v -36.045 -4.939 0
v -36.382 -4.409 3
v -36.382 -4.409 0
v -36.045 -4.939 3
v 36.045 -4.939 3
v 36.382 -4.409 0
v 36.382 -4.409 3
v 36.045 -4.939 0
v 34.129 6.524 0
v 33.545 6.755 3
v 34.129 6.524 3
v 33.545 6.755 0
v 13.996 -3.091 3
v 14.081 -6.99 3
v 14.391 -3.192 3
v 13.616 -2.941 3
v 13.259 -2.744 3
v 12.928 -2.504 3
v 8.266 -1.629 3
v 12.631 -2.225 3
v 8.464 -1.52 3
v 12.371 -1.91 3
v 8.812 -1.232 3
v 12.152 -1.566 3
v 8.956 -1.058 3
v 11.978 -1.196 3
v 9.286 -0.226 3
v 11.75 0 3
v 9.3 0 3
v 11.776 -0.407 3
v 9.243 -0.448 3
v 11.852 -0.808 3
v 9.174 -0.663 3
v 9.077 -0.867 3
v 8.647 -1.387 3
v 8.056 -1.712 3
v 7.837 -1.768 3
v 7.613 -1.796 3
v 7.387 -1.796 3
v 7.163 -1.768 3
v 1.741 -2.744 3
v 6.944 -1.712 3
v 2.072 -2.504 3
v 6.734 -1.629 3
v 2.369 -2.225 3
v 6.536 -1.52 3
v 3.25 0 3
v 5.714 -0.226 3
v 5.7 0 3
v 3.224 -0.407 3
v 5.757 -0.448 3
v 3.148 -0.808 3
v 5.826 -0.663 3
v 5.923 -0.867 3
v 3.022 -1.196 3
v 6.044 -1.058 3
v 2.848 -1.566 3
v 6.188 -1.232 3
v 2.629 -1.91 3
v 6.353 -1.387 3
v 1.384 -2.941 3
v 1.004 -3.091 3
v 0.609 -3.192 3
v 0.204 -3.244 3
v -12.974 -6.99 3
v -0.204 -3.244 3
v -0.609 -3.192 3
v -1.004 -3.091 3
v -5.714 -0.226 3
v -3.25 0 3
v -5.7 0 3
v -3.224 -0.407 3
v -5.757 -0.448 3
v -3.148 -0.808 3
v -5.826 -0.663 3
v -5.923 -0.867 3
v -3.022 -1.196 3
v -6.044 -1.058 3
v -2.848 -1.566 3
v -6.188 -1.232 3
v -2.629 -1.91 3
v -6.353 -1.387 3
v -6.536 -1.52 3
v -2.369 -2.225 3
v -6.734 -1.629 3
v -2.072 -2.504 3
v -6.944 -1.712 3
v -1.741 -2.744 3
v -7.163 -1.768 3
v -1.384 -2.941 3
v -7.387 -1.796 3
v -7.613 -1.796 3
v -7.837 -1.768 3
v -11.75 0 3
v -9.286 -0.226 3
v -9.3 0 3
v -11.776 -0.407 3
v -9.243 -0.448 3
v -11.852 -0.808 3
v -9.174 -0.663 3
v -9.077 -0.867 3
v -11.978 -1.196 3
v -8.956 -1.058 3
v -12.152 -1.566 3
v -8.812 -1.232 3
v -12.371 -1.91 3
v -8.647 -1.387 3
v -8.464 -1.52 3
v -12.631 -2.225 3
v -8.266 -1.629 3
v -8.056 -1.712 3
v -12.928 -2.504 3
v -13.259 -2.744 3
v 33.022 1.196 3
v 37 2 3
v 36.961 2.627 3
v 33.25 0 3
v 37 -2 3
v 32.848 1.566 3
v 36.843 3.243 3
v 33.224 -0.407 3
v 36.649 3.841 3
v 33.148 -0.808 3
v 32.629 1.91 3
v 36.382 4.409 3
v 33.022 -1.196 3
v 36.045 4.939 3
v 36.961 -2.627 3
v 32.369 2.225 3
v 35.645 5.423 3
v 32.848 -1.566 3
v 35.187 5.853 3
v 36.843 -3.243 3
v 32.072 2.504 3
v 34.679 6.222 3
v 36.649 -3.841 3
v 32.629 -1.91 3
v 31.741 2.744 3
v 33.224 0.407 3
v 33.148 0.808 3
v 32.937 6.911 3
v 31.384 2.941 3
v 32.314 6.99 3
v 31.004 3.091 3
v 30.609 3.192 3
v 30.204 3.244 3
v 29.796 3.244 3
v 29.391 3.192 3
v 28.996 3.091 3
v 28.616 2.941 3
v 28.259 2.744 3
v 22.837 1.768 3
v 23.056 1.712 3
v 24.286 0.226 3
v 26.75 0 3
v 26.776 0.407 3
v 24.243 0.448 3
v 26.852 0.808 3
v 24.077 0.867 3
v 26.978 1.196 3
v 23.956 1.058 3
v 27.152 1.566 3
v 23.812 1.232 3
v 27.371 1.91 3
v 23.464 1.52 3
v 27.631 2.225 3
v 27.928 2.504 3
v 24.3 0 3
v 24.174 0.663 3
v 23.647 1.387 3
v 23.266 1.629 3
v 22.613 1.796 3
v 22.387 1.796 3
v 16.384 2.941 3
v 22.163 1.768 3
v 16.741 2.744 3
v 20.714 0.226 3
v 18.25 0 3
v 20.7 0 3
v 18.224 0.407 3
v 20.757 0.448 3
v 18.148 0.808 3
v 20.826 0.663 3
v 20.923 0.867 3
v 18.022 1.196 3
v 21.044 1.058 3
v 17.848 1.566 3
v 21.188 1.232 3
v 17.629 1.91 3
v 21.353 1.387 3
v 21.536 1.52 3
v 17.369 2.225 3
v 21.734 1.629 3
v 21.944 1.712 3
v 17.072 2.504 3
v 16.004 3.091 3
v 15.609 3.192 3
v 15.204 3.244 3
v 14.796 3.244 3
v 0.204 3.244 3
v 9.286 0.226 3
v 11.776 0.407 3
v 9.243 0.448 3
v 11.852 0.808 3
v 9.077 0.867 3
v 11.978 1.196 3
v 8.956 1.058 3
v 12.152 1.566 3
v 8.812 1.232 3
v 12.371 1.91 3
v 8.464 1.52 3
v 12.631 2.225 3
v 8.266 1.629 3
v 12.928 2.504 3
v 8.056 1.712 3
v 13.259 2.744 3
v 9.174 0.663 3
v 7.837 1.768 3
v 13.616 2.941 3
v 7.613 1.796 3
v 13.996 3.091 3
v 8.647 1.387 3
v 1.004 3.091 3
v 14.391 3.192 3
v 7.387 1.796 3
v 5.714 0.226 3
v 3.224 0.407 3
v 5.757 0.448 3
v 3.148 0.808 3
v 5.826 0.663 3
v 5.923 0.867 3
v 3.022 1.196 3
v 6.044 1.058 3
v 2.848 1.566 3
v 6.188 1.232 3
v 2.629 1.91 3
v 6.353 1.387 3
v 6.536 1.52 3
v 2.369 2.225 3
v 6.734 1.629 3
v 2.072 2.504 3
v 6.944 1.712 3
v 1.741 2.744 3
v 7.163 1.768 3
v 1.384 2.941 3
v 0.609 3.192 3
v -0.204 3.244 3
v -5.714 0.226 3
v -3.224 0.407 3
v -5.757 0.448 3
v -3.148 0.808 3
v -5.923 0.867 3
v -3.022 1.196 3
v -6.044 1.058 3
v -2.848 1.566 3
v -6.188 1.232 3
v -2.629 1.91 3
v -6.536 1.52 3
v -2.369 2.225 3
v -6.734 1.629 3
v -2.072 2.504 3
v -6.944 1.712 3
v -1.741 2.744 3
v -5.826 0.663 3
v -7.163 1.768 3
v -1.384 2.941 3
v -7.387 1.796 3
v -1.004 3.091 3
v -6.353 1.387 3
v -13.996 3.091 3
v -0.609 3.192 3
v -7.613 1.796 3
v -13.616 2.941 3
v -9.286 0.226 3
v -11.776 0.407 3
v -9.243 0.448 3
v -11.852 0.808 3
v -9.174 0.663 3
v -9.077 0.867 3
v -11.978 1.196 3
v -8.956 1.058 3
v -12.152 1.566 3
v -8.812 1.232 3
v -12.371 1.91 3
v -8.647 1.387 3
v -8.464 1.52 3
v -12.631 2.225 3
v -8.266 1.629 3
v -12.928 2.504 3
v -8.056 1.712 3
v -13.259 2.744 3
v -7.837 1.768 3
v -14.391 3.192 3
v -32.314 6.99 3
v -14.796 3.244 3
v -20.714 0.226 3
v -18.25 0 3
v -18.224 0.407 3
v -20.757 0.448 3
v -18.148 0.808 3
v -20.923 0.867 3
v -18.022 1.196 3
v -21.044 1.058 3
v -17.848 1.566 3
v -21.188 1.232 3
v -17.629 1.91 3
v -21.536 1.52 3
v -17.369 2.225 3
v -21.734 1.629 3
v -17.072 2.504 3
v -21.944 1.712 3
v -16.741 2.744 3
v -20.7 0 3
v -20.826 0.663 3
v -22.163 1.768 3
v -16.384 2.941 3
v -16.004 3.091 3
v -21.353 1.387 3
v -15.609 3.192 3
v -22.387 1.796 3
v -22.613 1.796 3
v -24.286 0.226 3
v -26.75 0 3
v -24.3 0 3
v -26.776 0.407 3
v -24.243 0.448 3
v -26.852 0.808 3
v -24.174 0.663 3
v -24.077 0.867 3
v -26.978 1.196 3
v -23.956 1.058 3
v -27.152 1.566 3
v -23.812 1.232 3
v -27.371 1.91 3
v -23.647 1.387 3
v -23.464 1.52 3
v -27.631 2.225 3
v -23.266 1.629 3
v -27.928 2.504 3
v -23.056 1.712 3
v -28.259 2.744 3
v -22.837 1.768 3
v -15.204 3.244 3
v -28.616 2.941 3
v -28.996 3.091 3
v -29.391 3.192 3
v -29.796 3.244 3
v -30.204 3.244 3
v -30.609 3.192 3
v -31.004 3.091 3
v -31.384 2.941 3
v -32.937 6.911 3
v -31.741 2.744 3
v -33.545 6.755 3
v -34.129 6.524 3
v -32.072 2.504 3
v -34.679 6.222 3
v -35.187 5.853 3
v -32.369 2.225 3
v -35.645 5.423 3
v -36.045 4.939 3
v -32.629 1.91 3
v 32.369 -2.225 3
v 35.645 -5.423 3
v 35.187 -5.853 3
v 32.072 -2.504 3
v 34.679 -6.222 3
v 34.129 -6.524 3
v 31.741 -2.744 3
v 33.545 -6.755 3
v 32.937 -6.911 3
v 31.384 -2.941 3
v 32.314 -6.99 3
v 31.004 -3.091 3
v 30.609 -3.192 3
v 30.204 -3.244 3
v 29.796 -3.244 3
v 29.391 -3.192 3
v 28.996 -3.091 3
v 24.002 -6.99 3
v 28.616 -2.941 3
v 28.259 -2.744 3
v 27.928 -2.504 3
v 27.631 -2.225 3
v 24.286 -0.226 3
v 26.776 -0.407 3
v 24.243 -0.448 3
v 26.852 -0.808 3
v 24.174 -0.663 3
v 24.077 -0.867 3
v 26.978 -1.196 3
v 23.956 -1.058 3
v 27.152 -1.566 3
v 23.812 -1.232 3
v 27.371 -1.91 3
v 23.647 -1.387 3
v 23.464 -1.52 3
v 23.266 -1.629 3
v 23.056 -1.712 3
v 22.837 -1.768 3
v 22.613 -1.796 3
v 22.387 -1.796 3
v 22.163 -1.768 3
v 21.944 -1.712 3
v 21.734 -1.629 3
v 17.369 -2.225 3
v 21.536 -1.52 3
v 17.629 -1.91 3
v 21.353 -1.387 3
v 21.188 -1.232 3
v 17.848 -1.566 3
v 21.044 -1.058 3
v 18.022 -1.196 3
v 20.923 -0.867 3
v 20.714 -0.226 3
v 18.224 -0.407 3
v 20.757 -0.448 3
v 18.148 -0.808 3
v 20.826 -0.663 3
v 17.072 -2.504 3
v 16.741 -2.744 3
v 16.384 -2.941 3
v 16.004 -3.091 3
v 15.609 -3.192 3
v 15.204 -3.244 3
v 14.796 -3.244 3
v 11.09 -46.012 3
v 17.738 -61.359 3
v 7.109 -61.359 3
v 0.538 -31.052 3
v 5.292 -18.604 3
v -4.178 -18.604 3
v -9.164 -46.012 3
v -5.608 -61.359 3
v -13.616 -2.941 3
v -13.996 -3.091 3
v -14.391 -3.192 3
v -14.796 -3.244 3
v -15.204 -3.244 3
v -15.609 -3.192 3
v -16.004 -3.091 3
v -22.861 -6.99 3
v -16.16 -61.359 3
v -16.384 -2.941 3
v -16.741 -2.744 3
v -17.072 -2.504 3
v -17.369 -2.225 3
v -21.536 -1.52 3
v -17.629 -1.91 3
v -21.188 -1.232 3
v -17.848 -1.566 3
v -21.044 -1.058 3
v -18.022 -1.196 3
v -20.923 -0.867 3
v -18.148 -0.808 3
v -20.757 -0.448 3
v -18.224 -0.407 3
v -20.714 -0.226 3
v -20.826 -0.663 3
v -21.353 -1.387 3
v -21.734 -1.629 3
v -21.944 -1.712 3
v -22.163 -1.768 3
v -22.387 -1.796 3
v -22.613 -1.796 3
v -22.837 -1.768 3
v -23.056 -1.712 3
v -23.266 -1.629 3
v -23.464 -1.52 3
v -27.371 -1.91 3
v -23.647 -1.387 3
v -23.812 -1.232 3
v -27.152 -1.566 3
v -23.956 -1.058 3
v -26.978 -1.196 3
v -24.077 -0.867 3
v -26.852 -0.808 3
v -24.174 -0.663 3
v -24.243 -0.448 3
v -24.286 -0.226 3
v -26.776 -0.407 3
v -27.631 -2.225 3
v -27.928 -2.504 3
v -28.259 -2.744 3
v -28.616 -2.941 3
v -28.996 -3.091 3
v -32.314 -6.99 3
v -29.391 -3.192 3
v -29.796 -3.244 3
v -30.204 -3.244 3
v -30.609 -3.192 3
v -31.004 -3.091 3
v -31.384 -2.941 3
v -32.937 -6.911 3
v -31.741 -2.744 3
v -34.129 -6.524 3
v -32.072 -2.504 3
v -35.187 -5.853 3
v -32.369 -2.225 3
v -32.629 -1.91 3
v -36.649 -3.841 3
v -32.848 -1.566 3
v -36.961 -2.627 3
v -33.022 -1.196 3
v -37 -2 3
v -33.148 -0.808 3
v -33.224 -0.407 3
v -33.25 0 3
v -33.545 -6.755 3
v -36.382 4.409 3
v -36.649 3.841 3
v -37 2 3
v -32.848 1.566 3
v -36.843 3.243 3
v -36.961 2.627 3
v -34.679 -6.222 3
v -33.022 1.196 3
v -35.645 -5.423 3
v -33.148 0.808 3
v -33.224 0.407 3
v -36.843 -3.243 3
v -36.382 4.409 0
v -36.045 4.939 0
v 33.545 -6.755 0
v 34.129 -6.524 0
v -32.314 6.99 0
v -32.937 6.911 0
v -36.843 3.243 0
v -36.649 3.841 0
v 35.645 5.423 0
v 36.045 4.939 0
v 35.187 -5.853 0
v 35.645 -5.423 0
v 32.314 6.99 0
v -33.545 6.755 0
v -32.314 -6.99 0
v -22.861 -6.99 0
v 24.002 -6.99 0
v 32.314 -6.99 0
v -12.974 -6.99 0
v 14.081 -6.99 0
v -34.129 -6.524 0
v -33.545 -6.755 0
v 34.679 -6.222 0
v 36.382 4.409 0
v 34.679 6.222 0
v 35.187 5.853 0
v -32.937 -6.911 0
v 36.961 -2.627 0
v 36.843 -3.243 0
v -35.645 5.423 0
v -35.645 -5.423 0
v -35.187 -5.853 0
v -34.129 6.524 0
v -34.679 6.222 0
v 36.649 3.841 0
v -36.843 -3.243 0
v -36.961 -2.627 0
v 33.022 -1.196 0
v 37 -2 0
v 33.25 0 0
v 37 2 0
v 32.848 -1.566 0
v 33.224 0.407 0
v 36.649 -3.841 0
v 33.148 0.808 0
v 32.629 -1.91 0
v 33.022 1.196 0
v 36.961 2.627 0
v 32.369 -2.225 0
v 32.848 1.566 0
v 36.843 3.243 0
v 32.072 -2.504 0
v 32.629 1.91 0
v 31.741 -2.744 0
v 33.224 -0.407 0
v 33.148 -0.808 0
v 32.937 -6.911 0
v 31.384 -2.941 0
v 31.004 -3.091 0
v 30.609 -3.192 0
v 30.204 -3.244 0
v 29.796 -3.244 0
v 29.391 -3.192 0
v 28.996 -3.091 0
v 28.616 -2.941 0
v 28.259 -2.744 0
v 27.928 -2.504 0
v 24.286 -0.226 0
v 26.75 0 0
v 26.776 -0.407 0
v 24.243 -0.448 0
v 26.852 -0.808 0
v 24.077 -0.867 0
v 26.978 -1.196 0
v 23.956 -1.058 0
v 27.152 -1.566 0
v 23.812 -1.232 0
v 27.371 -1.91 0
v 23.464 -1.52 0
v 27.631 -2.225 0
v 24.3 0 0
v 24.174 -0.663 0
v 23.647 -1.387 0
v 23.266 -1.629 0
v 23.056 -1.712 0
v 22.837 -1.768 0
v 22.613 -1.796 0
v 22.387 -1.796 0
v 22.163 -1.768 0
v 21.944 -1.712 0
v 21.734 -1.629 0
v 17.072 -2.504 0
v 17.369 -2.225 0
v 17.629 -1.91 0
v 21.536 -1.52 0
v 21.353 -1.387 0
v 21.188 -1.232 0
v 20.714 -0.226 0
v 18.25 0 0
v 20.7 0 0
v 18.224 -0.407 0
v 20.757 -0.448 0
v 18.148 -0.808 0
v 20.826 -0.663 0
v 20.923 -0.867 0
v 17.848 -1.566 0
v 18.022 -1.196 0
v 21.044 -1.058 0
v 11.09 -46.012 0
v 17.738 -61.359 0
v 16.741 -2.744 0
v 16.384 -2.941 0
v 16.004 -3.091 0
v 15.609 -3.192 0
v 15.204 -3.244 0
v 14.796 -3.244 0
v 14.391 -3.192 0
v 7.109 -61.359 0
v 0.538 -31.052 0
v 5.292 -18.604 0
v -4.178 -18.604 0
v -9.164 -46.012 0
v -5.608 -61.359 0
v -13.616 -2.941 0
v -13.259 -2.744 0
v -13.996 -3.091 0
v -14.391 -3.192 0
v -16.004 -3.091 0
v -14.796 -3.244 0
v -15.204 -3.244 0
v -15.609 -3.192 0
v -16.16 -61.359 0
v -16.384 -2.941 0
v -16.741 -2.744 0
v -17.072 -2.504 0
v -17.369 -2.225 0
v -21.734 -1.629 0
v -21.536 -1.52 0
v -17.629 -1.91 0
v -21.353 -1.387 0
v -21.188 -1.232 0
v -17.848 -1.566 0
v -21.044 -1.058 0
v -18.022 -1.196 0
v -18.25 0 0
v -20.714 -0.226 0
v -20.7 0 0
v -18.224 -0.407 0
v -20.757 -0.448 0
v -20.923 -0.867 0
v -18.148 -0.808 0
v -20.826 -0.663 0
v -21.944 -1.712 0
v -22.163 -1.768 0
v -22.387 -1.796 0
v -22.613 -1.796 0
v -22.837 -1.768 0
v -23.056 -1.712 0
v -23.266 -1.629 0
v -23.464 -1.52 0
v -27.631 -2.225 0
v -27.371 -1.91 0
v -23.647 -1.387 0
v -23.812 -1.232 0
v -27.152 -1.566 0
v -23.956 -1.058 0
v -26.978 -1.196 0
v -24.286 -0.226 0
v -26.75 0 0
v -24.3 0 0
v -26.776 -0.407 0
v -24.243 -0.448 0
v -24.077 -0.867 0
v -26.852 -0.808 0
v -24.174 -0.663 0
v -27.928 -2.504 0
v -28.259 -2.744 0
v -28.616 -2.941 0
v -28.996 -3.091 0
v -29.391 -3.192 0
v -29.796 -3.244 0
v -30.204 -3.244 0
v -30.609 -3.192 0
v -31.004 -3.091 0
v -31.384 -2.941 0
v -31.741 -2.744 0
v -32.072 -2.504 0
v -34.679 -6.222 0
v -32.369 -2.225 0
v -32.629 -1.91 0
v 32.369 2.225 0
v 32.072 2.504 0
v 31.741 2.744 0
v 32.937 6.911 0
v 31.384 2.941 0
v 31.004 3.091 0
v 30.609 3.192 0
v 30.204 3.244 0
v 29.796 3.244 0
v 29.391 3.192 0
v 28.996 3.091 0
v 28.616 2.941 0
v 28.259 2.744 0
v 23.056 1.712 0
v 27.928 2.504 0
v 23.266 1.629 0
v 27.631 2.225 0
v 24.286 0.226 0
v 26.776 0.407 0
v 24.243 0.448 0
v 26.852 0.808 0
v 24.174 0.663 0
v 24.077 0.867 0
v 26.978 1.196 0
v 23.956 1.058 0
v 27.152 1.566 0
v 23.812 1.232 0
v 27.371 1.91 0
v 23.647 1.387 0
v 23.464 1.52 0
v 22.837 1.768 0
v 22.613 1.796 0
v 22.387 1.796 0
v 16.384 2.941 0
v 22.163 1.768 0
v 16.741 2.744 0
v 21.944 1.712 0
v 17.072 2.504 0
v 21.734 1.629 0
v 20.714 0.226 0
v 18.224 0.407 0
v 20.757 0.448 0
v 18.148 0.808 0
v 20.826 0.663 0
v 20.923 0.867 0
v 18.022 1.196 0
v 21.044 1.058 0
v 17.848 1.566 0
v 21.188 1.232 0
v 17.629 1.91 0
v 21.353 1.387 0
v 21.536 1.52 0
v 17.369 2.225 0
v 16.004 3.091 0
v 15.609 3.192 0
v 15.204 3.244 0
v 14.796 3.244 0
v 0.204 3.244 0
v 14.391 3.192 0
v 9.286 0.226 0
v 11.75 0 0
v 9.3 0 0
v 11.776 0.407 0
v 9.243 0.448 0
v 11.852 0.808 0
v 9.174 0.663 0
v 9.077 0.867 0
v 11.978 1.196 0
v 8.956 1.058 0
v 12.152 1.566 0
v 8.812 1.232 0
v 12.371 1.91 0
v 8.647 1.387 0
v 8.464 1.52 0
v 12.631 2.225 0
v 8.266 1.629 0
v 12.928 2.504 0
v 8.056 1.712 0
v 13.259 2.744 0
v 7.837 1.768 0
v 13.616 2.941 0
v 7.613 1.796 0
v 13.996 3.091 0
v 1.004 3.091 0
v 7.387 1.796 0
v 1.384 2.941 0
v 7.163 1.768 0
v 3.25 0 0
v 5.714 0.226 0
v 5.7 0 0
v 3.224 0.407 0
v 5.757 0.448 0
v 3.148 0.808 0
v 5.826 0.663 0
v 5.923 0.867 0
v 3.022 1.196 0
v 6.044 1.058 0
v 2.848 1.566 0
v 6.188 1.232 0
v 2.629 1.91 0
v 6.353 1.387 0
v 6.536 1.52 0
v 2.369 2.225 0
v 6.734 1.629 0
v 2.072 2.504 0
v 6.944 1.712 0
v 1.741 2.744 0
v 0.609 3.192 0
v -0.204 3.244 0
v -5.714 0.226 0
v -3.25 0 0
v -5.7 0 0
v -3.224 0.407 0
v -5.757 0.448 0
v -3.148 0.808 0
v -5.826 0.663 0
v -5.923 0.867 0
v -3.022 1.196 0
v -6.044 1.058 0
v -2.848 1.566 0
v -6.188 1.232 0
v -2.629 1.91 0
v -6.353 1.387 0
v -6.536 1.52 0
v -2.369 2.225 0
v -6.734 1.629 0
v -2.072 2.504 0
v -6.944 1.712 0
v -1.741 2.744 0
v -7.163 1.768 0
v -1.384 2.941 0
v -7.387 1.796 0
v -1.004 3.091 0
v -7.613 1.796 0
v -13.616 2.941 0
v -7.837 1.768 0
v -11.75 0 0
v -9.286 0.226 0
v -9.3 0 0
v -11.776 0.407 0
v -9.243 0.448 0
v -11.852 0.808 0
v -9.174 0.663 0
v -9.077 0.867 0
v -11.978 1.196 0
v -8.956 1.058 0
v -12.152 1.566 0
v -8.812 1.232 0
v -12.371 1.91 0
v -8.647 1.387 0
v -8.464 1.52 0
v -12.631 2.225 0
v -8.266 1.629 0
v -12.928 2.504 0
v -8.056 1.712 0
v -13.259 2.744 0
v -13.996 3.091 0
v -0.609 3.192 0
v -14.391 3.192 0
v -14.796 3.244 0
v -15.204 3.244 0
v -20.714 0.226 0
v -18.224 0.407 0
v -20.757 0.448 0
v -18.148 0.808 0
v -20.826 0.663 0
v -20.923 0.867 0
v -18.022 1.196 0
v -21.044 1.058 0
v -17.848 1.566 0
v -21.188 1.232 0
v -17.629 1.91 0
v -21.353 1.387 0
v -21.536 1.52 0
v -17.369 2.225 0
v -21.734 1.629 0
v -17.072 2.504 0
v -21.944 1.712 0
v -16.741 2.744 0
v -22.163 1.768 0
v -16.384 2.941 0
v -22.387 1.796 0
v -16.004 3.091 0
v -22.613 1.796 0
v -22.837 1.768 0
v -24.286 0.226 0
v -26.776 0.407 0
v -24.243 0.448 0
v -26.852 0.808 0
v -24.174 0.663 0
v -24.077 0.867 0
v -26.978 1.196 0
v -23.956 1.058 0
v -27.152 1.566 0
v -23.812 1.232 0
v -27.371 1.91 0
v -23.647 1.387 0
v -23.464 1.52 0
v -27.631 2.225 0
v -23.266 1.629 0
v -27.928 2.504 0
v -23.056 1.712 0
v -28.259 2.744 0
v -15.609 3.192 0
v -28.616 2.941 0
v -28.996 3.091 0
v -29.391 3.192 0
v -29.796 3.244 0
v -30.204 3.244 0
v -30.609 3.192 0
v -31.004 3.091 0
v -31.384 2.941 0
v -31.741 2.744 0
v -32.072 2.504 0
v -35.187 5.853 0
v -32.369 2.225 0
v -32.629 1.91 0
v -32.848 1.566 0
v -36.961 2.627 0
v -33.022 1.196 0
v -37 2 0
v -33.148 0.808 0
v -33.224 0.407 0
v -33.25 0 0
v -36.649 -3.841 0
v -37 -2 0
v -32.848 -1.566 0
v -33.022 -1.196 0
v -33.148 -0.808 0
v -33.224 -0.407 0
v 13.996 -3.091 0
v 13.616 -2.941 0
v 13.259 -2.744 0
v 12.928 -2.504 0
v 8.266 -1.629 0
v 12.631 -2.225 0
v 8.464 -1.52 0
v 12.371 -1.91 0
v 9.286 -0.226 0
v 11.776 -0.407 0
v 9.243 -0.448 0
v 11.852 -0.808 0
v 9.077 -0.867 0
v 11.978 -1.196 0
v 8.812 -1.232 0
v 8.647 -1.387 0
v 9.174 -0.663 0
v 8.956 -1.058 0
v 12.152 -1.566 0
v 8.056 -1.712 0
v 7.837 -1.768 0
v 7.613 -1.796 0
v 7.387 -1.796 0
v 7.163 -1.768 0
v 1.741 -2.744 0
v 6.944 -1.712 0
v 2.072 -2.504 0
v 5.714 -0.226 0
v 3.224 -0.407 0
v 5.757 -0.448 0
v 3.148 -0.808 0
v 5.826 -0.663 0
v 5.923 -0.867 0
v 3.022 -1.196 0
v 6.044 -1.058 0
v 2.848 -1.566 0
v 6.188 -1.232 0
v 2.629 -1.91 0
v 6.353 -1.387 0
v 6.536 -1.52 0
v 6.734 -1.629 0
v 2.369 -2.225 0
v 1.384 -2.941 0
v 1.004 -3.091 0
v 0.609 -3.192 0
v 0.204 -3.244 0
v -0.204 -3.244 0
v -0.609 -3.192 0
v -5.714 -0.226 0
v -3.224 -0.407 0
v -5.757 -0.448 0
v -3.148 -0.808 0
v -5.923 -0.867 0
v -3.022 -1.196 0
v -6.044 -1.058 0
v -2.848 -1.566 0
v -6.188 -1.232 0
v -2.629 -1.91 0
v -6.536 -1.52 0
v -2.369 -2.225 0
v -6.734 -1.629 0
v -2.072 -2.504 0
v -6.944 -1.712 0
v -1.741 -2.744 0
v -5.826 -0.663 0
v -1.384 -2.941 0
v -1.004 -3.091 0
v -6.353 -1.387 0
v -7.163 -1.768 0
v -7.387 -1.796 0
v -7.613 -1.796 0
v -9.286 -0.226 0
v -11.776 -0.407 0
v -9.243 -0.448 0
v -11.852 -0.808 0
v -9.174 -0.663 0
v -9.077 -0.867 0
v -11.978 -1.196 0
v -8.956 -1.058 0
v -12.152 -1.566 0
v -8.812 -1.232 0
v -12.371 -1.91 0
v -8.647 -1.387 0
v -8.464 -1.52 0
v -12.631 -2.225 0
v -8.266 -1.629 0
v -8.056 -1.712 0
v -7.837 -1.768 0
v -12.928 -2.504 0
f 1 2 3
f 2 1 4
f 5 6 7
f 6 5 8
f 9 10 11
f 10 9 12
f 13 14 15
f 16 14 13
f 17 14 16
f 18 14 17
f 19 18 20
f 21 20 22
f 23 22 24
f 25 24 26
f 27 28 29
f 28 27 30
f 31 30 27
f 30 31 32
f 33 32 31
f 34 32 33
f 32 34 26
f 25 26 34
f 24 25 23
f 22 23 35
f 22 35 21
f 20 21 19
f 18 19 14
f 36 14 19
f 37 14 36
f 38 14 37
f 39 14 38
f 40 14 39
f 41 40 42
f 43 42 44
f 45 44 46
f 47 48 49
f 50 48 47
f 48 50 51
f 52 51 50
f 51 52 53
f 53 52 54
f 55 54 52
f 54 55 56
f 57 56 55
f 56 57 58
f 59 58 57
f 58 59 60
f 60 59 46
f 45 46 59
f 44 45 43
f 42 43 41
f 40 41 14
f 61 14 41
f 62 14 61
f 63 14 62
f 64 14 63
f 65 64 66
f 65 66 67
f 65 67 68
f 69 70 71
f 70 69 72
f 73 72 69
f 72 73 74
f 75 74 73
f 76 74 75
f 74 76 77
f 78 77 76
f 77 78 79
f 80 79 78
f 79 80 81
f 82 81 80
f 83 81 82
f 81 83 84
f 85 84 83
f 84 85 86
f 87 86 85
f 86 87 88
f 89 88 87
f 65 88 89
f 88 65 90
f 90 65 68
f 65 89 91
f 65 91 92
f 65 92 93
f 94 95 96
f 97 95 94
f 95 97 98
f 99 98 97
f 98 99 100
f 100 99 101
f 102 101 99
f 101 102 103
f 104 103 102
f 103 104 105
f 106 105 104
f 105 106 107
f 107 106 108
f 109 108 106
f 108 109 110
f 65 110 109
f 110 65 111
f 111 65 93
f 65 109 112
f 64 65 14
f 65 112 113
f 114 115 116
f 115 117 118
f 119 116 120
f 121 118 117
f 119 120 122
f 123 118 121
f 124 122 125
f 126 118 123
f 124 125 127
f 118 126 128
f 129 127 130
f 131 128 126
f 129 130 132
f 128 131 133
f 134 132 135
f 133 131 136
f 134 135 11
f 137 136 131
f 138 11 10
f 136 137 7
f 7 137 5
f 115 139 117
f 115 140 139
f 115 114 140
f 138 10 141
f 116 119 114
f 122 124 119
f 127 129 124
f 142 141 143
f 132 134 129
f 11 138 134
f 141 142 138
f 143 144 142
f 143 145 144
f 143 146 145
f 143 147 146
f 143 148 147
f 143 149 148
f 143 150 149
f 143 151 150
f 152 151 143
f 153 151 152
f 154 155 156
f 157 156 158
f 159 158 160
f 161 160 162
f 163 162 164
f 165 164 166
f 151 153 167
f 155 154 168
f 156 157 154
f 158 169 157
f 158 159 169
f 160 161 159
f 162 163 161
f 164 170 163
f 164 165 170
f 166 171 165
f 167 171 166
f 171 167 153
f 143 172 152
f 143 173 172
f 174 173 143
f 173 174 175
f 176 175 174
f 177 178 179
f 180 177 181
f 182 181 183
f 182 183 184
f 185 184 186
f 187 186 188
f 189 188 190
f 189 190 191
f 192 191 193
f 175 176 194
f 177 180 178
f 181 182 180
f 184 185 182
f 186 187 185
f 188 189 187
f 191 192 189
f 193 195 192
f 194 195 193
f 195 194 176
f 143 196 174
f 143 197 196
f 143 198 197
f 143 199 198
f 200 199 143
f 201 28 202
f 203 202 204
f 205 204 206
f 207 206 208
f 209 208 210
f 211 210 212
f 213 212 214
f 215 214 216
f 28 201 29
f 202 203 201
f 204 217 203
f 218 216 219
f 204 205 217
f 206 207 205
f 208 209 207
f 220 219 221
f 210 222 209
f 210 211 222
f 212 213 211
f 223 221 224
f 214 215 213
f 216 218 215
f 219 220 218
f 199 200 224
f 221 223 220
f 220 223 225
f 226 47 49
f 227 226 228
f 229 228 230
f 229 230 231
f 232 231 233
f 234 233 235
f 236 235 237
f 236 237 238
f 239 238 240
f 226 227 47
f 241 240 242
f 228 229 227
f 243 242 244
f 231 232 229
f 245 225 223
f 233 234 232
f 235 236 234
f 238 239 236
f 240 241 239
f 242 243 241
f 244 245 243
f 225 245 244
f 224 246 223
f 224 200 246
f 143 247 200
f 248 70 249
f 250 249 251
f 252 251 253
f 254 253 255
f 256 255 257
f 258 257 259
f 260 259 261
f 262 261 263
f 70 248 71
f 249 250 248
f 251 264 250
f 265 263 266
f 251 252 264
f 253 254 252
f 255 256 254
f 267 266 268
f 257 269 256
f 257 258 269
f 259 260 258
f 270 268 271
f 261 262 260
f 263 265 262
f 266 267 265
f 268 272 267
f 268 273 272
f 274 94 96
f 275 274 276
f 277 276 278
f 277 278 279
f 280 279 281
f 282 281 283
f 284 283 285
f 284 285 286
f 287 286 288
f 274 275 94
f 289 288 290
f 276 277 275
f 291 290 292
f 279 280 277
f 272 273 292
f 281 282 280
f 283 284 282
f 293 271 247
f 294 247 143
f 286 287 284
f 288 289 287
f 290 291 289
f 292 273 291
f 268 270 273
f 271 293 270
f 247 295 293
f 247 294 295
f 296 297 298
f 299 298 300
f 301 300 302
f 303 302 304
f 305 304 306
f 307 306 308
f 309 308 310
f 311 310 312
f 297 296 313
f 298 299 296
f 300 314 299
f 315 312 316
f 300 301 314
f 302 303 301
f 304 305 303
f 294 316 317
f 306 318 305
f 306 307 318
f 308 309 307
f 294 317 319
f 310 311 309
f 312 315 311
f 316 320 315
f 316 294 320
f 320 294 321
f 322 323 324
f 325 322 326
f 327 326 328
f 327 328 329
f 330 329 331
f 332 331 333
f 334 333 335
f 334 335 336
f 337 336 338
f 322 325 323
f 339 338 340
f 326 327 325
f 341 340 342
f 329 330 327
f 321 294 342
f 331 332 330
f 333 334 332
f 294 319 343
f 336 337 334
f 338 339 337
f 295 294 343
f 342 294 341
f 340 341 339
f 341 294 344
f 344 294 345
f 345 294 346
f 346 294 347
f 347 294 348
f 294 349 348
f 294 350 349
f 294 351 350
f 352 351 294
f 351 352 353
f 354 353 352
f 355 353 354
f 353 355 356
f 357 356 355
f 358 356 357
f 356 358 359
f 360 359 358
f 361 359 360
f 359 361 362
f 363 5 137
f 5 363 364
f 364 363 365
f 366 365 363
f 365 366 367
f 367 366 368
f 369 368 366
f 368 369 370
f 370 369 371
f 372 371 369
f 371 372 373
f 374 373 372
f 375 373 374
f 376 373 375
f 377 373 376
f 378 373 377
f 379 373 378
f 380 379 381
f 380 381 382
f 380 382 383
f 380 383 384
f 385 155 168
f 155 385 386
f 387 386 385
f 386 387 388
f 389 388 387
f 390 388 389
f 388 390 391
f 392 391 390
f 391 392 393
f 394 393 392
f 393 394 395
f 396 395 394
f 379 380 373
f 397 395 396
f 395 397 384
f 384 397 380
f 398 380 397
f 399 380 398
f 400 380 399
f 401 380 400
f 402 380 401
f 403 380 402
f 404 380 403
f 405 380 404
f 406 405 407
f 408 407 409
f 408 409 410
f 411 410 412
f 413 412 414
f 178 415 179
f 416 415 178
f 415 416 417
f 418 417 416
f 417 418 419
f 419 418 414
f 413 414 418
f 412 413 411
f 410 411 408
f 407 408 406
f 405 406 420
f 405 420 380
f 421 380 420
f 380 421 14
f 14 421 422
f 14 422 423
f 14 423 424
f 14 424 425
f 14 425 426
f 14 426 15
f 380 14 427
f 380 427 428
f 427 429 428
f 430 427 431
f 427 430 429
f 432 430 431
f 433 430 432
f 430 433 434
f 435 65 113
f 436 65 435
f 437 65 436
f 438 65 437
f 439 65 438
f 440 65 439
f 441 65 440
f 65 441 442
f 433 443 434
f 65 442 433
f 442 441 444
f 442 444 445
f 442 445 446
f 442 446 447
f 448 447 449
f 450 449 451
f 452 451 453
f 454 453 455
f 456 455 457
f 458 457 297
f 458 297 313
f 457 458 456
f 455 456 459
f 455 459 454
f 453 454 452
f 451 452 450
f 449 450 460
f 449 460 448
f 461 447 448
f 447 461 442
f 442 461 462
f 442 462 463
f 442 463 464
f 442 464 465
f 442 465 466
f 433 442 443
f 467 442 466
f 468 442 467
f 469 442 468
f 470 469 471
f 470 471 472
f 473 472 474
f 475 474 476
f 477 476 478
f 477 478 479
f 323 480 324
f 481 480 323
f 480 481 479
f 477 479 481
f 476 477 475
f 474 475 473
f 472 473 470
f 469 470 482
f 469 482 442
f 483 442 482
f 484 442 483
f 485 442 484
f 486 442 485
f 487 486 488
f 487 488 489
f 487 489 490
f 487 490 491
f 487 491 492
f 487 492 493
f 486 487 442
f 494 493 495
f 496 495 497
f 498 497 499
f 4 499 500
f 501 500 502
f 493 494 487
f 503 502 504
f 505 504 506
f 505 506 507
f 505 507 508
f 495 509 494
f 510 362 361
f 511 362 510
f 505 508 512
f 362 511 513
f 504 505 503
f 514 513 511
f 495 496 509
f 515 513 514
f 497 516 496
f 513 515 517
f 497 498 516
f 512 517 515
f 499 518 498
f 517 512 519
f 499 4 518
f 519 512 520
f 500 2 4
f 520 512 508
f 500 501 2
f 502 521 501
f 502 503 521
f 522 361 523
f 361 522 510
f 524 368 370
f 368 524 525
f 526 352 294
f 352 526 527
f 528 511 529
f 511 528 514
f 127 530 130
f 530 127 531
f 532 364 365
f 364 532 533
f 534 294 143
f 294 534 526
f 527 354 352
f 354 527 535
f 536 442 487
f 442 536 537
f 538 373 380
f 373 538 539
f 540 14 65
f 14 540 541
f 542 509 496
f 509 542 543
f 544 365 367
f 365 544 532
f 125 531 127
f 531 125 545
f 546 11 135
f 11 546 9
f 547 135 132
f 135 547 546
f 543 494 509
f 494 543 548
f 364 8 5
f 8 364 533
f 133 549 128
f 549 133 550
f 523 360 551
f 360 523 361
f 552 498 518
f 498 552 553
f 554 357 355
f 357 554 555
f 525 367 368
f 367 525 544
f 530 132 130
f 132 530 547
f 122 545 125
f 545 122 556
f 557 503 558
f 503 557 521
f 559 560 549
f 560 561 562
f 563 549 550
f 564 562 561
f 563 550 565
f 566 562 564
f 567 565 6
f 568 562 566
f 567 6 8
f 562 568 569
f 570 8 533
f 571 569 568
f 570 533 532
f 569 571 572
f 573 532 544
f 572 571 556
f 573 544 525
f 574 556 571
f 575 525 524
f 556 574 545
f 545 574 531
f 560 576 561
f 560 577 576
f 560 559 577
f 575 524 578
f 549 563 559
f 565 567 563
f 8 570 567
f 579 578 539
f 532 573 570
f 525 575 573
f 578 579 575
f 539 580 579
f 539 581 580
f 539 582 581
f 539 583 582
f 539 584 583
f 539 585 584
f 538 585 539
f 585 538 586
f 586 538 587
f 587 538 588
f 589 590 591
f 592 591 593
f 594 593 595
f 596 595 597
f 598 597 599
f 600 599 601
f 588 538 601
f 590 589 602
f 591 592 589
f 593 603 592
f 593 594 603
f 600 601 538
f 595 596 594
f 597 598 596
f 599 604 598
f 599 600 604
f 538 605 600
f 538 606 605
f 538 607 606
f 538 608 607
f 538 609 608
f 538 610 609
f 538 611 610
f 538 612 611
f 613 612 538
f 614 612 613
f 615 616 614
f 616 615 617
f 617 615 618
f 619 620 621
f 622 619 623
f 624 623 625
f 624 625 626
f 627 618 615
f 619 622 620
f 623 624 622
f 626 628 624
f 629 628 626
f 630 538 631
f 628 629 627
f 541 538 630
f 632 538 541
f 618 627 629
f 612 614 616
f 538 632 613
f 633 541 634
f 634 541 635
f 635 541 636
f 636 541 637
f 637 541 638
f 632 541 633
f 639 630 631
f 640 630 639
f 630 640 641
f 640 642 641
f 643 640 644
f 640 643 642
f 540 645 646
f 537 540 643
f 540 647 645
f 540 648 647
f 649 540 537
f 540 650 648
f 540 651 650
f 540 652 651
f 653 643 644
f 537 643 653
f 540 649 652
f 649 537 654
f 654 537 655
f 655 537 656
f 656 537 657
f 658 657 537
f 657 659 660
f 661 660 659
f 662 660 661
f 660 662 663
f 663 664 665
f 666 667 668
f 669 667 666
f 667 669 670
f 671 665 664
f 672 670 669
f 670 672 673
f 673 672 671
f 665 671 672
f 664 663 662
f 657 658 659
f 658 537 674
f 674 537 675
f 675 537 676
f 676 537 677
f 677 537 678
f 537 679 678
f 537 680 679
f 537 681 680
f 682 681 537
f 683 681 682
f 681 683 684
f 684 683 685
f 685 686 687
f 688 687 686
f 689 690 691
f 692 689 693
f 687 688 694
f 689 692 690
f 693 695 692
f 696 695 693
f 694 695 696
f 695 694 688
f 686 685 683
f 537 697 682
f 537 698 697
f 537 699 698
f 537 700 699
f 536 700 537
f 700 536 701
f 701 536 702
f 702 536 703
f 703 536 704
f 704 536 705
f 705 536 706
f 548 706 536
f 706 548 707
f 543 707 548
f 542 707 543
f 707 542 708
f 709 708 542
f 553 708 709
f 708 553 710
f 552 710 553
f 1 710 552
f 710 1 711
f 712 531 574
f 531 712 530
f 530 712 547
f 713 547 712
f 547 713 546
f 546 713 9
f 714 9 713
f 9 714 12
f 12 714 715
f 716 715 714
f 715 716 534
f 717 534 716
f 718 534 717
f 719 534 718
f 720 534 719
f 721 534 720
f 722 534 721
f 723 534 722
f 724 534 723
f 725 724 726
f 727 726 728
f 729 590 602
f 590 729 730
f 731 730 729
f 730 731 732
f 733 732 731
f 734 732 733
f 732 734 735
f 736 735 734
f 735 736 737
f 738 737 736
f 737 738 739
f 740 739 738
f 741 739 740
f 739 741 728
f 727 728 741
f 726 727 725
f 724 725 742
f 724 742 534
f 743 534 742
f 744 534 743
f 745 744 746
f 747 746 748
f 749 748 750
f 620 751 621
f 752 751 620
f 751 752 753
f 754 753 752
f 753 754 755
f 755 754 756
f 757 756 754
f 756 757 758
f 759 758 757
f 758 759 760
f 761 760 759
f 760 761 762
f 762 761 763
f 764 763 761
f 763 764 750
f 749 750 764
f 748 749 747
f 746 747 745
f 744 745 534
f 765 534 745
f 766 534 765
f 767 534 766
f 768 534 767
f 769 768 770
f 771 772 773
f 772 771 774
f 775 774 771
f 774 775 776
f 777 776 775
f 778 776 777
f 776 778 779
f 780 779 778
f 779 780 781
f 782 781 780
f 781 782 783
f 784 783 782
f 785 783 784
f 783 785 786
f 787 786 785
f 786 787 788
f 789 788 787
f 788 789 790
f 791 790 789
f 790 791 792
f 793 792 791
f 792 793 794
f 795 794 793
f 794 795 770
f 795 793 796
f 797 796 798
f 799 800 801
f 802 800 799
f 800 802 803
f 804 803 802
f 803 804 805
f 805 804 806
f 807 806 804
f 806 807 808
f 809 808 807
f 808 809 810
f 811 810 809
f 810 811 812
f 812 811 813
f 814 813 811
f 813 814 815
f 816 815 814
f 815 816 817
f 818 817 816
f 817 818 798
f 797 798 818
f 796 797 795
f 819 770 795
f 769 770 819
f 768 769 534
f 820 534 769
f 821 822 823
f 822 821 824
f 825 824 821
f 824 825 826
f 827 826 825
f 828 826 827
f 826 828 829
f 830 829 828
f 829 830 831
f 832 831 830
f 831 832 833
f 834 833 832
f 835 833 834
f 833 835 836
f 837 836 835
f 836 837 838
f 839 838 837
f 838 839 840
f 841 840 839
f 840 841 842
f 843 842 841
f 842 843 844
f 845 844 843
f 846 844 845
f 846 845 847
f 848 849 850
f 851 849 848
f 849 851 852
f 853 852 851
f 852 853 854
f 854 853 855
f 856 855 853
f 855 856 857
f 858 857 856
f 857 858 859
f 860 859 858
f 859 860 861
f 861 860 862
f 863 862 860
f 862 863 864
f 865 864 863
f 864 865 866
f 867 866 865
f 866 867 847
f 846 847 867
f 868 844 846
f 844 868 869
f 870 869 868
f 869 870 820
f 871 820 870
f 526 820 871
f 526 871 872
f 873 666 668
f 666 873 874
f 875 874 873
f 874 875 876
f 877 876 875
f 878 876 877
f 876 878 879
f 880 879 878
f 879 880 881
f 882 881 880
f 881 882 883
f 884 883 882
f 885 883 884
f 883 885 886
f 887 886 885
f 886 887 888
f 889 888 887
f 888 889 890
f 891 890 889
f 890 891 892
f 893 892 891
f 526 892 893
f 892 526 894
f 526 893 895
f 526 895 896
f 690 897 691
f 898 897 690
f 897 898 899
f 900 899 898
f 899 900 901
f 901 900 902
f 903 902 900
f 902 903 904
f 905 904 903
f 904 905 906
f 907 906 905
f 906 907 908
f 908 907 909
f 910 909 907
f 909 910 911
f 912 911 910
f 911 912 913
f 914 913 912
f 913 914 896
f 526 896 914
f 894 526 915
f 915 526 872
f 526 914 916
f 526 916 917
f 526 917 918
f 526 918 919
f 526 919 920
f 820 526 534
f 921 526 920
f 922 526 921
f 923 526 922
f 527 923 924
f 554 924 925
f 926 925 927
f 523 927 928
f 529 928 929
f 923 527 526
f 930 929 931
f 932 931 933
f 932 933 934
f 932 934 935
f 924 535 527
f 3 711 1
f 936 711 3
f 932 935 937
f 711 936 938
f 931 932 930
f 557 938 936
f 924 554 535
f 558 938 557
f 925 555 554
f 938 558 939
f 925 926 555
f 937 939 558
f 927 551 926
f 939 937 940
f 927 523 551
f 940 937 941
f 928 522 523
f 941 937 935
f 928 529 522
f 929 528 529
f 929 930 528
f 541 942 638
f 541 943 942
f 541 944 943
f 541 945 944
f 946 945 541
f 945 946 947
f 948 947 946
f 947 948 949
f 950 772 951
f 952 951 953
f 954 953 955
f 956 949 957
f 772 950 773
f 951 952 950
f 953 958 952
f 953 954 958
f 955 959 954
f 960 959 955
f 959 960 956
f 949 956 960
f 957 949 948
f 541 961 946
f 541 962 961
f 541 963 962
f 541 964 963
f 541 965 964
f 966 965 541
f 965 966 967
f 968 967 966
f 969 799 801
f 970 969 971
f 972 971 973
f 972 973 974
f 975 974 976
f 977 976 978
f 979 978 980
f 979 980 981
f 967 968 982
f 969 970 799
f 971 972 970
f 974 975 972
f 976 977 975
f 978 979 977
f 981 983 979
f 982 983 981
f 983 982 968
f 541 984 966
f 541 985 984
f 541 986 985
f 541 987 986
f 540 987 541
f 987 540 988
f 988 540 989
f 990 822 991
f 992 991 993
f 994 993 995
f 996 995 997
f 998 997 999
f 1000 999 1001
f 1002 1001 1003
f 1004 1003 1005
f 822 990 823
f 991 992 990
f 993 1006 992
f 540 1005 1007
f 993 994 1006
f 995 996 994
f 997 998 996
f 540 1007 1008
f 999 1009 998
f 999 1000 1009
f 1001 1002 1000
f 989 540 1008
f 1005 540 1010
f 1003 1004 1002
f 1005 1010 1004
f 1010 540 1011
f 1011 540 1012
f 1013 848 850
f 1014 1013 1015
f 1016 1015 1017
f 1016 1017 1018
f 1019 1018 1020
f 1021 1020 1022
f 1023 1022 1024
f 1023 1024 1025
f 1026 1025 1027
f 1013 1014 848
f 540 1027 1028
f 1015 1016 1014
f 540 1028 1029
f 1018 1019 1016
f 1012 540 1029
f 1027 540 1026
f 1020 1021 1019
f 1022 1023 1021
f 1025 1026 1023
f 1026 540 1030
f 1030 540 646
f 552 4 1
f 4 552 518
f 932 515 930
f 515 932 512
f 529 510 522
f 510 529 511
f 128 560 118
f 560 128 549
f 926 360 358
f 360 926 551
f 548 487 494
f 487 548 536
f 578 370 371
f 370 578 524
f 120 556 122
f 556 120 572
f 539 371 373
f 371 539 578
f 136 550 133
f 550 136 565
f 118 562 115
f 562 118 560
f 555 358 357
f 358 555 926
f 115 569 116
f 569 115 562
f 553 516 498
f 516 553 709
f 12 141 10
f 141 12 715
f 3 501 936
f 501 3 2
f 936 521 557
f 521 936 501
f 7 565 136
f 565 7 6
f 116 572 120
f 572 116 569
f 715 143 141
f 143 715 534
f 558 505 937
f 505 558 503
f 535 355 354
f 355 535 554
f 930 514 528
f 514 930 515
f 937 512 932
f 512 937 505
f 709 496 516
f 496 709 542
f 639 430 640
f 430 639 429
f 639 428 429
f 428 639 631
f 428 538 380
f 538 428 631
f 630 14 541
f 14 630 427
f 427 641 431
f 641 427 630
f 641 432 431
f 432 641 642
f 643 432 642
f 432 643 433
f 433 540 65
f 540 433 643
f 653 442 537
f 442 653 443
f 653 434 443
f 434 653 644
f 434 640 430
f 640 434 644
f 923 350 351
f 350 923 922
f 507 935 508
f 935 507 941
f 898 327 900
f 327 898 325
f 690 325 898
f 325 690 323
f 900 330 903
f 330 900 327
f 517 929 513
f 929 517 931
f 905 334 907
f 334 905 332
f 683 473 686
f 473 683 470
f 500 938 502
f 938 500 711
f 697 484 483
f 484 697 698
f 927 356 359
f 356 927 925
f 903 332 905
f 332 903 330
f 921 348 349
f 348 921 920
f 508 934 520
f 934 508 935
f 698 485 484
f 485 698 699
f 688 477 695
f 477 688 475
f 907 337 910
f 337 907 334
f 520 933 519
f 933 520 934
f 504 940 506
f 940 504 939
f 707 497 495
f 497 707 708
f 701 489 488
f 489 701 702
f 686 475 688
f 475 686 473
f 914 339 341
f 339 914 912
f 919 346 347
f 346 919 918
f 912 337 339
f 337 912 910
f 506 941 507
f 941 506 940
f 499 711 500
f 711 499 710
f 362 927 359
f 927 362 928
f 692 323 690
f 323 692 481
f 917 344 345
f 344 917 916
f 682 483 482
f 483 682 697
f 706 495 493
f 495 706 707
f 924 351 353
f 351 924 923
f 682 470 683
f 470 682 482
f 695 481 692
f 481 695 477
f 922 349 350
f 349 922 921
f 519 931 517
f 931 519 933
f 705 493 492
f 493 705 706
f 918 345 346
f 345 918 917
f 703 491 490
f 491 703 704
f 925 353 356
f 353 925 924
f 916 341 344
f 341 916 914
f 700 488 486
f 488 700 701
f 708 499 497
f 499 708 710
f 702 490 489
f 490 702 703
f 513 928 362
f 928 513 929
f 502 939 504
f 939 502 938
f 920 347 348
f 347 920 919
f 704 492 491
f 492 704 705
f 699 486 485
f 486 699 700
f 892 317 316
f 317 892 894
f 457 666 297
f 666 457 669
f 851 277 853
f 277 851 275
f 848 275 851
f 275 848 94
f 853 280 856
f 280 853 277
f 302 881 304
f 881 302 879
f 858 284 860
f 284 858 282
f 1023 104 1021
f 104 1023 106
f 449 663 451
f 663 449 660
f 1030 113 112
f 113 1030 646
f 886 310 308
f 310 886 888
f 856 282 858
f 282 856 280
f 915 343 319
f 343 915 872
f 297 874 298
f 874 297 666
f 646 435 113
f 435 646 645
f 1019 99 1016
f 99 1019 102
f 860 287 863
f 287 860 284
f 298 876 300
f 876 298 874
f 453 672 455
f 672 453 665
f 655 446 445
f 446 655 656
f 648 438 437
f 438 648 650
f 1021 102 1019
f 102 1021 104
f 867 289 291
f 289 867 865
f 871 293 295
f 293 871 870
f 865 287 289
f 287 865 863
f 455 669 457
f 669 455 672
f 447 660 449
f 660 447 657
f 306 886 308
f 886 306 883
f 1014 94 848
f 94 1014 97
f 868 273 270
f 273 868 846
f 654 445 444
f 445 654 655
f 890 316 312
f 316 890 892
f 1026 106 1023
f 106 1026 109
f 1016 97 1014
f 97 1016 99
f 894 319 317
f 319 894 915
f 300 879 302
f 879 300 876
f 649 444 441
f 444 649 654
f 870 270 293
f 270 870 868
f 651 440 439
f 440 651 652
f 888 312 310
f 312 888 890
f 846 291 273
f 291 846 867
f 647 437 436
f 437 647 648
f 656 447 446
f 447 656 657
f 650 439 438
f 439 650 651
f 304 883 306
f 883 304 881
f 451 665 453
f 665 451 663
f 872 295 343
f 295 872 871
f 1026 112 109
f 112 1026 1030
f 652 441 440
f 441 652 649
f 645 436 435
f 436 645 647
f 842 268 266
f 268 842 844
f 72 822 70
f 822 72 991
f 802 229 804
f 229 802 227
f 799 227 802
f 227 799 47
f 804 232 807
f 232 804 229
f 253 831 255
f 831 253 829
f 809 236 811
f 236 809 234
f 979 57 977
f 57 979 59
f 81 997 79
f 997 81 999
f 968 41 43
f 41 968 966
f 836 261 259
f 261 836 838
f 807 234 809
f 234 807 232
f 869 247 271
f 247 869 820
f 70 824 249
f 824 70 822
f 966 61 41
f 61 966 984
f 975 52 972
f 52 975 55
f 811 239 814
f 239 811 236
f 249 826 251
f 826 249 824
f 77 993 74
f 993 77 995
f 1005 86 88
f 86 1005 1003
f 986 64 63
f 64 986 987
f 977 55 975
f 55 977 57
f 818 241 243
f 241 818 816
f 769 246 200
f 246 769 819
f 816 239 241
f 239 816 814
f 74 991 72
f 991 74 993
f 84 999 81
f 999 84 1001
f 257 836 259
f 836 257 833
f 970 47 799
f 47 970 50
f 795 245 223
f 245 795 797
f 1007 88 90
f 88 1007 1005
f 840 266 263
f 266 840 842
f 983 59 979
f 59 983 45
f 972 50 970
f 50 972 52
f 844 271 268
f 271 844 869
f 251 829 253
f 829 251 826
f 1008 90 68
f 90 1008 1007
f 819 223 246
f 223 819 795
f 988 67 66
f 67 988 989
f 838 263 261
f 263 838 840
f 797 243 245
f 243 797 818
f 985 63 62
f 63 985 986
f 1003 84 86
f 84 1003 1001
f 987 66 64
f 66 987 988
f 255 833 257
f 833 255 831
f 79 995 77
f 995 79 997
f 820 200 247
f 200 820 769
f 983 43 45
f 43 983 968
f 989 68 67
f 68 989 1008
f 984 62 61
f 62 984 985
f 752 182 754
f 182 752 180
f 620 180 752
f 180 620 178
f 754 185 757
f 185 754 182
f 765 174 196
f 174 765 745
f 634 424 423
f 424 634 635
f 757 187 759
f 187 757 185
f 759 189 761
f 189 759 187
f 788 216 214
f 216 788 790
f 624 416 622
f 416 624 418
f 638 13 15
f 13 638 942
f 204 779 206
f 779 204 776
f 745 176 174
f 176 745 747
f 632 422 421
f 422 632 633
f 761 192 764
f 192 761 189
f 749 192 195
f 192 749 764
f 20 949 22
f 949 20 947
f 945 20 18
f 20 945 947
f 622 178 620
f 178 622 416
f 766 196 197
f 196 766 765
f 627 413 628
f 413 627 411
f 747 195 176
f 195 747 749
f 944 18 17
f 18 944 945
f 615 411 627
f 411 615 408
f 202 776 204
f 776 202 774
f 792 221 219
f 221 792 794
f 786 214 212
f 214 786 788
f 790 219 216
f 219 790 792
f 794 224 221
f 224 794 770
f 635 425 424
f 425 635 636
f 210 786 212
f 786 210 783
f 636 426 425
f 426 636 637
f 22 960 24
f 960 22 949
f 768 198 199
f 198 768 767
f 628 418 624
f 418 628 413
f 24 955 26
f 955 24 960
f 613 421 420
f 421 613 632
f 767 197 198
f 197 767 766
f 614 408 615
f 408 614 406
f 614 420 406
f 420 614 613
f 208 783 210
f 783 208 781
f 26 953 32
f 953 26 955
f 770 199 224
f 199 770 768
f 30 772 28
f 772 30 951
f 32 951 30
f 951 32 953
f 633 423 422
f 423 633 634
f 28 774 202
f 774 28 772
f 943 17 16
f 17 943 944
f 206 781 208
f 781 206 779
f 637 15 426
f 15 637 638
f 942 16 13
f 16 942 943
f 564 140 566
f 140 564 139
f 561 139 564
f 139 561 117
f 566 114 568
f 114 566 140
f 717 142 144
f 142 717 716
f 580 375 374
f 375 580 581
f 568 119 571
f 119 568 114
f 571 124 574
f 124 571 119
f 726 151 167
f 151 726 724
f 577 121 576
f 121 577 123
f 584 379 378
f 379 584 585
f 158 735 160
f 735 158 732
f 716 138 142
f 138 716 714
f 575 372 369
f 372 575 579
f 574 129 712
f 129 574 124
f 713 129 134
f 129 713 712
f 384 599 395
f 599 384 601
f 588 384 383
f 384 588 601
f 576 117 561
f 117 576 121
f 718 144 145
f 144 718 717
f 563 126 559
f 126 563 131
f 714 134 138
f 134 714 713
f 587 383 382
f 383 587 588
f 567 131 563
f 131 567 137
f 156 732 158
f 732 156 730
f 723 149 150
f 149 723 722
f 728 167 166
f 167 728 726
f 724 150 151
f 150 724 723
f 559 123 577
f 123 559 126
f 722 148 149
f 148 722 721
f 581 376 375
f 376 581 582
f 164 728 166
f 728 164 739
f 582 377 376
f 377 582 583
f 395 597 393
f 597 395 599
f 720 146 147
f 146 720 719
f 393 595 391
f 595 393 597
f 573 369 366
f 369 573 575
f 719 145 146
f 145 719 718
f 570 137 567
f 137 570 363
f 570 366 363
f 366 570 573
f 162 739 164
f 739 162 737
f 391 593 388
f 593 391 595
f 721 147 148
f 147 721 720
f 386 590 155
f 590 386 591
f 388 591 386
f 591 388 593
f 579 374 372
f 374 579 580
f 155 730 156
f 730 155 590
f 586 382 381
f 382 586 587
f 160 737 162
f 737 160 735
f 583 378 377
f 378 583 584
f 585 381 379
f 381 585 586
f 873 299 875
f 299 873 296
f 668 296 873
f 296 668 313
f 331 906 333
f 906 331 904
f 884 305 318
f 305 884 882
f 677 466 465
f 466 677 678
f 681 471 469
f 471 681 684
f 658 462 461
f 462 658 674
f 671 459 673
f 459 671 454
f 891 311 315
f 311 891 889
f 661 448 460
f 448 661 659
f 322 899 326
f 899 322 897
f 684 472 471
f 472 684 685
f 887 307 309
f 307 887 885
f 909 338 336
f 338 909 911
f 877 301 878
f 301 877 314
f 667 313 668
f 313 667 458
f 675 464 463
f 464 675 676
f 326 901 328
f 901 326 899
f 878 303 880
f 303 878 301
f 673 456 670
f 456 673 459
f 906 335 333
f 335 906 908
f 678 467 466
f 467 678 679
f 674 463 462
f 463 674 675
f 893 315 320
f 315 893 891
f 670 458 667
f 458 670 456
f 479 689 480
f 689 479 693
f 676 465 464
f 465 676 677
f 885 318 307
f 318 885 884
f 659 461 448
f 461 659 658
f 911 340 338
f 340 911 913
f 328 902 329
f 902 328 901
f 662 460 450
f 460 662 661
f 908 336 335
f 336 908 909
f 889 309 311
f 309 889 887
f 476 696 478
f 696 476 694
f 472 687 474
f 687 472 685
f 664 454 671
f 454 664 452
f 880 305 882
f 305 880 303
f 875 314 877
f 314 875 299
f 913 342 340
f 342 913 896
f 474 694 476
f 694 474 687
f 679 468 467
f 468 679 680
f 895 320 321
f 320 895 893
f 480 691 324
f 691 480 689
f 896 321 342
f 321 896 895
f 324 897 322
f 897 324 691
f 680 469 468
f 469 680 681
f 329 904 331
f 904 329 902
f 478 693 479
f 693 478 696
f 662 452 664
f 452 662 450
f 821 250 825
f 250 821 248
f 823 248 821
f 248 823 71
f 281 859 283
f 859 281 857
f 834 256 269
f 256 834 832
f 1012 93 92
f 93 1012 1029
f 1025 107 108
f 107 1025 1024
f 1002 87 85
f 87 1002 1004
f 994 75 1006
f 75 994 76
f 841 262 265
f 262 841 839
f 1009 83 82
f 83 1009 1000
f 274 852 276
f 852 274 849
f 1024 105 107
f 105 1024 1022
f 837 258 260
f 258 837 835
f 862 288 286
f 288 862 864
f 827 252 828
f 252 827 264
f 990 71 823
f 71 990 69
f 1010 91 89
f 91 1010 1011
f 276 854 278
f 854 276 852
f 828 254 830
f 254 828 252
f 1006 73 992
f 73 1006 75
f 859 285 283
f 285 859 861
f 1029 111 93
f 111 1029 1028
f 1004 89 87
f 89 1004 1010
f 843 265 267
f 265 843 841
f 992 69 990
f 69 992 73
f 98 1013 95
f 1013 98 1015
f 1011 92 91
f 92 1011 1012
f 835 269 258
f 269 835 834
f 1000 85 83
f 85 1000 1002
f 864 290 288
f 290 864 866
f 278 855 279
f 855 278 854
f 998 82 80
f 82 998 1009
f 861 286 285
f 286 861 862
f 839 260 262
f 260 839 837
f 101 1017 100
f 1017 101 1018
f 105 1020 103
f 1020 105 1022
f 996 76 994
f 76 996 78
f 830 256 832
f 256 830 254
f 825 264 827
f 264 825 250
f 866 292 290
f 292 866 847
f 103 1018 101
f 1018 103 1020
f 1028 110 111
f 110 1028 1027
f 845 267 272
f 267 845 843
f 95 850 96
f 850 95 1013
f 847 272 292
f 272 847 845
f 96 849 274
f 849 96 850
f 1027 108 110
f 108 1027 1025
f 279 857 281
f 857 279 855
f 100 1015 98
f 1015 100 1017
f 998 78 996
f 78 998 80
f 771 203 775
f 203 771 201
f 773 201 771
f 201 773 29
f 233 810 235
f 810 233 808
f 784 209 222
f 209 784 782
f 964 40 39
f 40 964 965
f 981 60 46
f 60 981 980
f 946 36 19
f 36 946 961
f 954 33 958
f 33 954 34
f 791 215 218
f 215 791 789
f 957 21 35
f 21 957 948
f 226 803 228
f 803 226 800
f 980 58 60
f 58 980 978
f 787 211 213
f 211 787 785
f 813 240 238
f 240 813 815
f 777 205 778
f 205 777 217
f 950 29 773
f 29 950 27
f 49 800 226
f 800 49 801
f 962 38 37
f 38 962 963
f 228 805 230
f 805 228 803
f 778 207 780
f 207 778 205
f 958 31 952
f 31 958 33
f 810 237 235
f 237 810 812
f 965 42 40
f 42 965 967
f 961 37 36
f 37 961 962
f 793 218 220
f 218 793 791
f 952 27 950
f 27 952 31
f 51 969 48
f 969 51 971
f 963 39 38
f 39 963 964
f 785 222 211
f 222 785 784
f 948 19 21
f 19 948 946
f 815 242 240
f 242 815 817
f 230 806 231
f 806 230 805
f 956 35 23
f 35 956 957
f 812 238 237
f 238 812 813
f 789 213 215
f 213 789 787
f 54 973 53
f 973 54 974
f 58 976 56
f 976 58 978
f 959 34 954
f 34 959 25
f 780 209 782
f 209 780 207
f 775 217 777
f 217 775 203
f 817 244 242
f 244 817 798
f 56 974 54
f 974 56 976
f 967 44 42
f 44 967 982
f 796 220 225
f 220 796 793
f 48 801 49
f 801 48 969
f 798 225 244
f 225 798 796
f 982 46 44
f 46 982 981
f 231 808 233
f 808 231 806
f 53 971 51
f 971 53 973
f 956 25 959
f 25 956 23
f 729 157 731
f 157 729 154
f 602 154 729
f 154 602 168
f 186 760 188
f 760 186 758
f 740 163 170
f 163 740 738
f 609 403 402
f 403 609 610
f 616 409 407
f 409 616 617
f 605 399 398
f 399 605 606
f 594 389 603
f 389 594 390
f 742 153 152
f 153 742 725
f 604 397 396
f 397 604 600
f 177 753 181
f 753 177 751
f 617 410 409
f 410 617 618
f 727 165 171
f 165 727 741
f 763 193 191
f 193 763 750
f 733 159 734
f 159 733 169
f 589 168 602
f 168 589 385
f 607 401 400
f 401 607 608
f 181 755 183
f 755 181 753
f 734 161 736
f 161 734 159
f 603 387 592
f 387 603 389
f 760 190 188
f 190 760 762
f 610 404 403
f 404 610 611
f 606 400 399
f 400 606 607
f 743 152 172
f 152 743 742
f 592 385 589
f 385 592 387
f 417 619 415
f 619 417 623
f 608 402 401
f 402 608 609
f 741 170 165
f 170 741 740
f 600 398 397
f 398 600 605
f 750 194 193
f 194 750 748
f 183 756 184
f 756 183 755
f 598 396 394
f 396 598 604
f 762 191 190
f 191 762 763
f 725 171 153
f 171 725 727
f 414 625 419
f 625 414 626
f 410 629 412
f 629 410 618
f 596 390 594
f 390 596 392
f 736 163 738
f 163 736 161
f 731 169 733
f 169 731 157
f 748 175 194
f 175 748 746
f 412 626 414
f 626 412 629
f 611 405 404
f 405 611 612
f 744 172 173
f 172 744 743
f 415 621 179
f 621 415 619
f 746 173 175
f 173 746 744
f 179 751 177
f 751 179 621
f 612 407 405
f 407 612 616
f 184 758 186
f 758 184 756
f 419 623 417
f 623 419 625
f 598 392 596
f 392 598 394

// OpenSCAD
$fn = 50;


difference() {
	union() {
		hull() {
			translate(v = [-32.0000000000, 2.0000000000, 0]) {
				cylinder(h = 3, r = 5);
			}
			translate(v = [32.0000000000, 2.0000000000, 0]) {
				cylinder(h = 3, r = 5);
			}
			translate(v = [-32.0000000000, -2.0000000000, 0]) {
				cylinder(h = 3, r = 5);
			}
			translate(v = [32.0000000000, -2.0000000000, 0]) {
				cylinder(h = 3, r = 5);
			}
		}
		translate(v = [0, -5, 0]) {
			linear_extrude(height = 3) {
				text(font = "DejaVu Sans Mono:style=Bold", halign = "center", size = 57.0000000000, text = "W", valign = "top");
			}
		}
	}
	union() {
		translate(v = [-30.0000000000, 0.0000000000, 0]) {
			translate(v = [0, 0, -100]) {
				cylinder(h = 200, r = 3.2500000000);
			}
		}
		translate(v = [-15.0000000000, 0.0000000000, 0]) {
			translate(v = [0, 0, -100]) {
				cylinder(h = 200, r = 3.2500000000);
			}
		}
		translate(v = [0, 0, -100]) {
			cylinder(h = 200, r = 3.2500000000);
		}
		translate(v = [15.0000000000, 0.0000000000, 0]) {
			translate(v = [0, 0, -100]) {
				cylinder(h = 200, r = 3.2500000000);
			}
		}
		translate(v = [30.0000000000, 0.0000000000, 0]) {
			translate(v = [0, 0, -100]) {
				cylinder(h = 200, r = 3.2500000000);
			}
		}
		translate(v = [-30.0000000000, 0.0000000000, 0]) {
			translate(v = [0, 0, -100]) {
				cylinder(h = 200, r = 1.8000000000);
			}
		}
		translate(v = [-22.5000000000, 0.0000000000, 0]) {
			translate(v = [0, 0, -100]) {
				cylinder(h = 200, r = 1.8000000000);
			}
		}
		translate(v = [-15.0000000000, 0.0000000000, 0]) {
			translate(v = [0, 0, -100]) {
				cylinder(h = 200, r = 1.8000000000);
			}
		}
		translate(v = [-7.5000000000, 0.0000000000, 0]) {
			translate(v = [0, 0, -100]) {
				cylinder(h = 200, r = 1.8000000000);
			}
		}
		translate(v = [0, 0, -100]) {
			cylinder(h = 200, r = 1.8000000000);
		}
		translate(v = [7.5000000000, 0.0000000000, 0]) {
			translate(v = [0, 0, -100]) {
				cylinder(h = 200, r = 1.8000000000);
			}
		}
		translate(v = [15.0000000000, 0.0000000000, 0]) {
			translate(v = [0, 0, -100]) {
				cylinder(h = 200, r = 1.8000000000);
			}
		}
		translate(v = [22.5000000000, 0.0000000000, 0]) {
			translate(v = [0, 0, -100]) {
				cylinder(h = 200, r = 1.8000000000);
			}
		}
		translate(v = [30.0000000000, 0.0000000000, 0]) {
			translate(v = [0, 0, -100]) {
				cylinder(h = 200, r = 1.8000000000);
			}
		}
	}
}
